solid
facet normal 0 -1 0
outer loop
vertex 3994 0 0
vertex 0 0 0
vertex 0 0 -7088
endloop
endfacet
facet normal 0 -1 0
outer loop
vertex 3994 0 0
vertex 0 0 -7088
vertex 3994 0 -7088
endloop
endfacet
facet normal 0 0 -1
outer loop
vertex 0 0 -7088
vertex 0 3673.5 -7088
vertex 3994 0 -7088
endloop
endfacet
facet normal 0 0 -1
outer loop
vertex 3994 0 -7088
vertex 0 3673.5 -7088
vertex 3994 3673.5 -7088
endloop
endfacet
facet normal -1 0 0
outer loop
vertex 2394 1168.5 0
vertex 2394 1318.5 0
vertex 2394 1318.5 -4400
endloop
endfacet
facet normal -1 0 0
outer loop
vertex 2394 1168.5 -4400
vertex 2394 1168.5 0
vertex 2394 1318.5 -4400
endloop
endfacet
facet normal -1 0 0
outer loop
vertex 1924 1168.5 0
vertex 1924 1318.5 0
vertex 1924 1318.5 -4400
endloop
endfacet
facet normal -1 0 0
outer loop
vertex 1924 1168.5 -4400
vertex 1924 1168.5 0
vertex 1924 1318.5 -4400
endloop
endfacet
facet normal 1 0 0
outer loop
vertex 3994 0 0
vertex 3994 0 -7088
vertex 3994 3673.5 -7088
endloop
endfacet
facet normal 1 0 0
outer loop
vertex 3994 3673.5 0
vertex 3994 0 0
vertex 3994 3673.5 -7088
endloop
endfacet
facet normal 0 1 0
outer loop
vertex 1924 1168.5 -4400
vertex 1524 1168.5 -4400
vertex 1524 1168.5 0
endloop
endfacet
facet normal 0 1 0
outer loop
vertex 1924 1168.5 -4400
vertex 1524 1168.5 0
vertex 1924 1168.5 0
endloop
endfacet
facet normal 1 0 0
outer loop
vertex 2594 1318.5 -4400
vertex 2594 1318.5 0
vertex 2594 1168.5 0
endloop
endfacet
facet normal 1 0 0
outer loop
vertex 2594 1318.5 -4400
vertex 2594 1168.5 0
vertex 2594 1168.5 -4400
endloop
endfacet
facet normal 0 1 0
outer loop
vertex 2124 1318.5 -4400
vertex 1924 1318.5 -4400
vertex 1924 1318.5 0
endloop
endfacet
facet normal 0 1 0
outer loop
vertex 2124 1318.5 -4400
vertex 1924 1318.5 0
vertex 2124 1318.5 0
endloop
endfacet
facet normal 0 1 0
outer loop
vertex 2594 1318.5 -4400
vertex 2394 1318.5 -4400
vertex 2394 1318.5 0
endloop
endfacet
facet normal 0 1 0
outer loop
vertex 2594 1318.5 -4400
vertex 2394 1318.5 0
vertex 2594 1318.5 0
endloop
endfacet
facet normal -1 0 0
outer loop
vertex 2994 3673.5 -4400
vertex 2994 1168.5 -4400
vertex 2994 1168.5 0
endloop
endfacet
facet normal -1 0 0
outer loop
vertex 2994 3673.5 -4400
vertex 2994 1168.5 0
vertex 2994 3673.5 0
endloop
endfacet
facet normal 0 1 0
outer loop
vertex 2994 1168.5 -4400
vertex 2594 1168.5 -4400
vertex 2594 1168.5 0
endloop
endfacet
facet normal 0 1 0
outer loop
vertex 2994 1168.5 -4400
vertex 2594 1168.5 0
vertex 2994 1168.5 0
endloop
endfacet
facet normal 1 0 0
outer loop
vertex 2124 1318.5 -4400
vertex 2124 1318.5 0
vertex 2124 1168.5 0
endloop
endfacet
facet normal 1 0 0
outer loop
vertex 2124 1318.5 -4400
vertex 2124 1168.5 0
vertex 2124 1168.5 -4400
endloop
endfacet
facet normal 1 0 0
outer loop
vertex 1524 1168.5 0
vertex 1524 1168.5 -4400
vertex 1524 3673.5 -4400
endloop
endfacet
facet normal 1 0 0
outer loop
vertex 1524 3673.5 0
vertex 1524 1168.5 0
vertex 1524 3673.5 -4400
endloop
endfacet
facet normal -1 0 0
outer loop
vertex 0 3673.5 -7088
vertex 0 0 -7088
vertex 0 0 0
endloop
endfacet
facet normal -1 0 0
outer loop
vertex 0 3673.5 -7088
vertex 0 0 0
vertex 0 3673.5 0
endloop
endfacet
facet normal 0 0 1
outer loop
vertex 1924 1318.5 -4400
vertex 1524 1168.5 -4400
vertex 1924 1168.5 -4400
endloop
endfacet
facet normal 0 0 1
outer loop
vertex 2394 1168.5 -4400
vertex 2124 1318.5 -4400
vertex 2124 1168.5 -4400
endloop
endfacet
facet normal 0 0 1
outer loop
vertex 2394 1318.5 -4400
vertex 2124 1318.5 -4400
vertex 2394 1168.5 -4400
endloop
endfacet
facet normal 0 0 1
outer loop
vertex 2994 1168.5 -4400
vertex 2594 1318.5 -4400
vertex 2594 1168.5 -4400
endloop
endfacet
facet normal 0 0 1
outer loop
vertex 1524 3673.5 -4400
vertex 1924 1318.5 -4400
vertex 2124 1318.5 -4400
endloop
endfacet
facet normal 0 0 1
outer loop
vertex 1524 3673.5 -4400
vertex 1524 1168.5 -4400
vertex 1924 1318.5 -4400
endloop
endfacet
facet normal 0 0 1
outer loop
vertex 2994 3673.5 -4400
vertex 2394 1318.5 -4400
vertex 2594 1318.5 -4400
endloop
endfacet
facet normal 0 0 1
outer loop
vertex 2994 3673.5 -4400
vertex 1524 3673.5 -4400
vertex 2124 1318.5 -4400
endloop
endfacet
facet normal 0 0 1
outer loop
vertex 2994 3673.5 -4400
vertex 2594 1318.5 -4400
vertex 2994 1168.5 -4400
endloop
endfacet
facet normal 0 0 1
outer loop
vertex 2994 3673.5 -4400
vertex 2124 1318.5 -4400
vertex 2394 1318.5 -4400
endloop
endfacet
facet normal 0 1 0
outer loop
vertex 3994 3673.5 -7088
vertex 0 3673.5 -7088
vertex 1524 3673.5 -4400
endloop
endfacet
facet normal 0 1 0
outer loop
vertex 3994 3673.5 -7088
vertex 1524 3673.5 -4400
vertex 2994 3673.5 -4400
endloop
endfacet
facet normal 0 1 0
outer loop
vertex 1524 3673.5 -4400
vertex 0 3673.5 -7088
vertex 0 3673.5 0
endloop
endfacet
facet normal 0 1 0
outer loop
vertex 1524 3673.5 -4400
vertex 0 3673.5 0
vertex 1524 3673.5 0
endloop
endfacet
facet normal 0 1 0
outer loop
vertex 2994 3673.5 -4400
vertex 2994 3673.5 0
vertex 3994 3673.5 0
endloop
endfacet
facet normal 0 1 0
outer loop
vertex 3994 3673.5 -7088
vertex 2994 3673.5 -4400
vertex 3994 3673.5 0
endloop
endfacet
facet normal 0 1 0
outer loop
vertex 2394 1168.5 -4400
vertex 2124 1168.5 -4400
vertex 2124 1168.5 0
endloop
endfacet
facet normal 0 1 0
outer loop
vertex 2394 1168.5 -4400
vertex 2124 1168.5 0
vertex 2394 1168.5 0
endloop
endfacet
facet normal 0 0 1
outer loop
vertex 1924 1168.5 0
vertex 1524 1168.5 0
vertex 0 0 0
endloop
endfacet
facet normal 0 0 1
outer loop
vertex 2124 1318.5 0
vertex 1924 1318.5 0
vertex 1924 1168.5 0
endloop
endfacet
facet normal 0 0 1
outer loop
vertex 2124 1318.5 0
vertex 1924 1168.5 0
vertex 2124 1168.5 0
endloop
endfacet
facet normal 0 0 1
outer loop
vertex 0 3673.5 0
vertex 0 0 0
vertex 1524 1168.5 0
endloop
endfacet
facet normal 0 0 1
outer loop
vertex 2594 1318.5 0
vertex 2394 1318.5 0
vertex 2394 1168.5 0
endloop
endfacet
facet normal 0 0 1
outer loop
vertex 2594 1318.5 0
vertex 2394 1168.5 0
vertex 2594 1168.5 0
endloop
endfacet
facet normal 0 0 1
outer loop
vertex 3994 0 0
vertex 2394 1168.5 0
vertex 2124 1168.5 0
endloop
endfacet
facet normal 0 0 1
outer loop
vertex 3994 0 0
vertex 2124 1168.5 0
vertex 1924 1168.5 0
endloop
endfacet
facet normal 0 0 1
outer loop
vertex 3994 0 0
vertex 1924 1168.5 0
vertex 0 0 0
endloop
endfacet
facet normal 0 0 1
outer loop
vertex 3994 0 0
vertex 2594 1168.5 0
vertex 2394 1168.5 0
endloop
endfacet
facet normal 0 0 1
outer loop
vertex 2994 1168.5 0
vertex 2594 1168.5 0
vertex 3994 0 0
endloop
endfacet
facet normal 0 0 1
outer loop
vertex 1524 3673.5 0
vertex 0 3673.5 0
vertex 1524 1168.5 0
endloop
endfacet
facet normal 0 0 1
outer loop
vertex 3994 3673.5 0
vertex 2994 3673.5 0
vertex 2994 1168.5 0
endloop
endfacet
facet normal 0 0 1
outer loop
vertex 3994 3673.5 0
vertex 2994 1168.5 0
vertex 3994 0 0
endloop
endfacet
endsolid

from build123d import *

# Parameters (mm, degrees)
SCHIZZO1_W                   = 3994
SCHIZZO1_H                   = 3673.5
ESTRUSIONE_ESTRUSIONE1_DEPTH = 7088
SCHIZZO2_W                   = 1470
SCHIZZO2_H                   = 2355
TAGLIO_ESTRUSIONE1_DEPTH     = 4400
SCHIZZO3_W                   = 400
SCHIZZO3_H                   = 4400
SCHIZZO3_W_2                 = 270
TAGLIO_ESTRUSIONE2_DEPTH     = 150


with BuildPart() as part:
    # Schizzo1 → Estrusione-Estrusione1 (new body)
    with BuildSketch(Plane.XY):
        with Locations((1997, 1836.75)):
            Rectangle(SCHIZZO1_W, SCHIZZO1_H)
    extrude(amount=-ESTRUSIONE_ESTRUSIONE1_DEPTH)

    # Schizzo2 → Taglio-Estrusione1 (cut)
    with BuildSketch(Plane.XY):
        with Locations((2259, 2496)):
            Rectangle(SCHIZZO2_W, SCHIZZO2_H)
    extrude(amount=-TAGLIO_ESTRUSIONE1_DEPTH, mode=Mode.SUBTRACT)

    # Schizzo3 → Taglio-Estrusione2 (cut)
    with BuildSketch(Plane(origin=(0, 1318.5, 0), x_dir=(1, 0, 0), z_dir=(0, 1, 0))):
        with Locations((1724, 2200)):
            Rectangle(SCHIZZO3_W, SCHIZZO3_H)
        with Locations((2259, 2200)):
            Rectangle(SCHIZZO3_W_2, SCHIZZO3_H)
        with Locations((2794, 2200)):
            Rectangle(SCHIZZO3_W, SCHIZZO3_H)
    extrude(amount=-TAGLIO_ESTRUSIONE2_DEPTH, mode=Mode.SUBTRACT)


solid = part.part
